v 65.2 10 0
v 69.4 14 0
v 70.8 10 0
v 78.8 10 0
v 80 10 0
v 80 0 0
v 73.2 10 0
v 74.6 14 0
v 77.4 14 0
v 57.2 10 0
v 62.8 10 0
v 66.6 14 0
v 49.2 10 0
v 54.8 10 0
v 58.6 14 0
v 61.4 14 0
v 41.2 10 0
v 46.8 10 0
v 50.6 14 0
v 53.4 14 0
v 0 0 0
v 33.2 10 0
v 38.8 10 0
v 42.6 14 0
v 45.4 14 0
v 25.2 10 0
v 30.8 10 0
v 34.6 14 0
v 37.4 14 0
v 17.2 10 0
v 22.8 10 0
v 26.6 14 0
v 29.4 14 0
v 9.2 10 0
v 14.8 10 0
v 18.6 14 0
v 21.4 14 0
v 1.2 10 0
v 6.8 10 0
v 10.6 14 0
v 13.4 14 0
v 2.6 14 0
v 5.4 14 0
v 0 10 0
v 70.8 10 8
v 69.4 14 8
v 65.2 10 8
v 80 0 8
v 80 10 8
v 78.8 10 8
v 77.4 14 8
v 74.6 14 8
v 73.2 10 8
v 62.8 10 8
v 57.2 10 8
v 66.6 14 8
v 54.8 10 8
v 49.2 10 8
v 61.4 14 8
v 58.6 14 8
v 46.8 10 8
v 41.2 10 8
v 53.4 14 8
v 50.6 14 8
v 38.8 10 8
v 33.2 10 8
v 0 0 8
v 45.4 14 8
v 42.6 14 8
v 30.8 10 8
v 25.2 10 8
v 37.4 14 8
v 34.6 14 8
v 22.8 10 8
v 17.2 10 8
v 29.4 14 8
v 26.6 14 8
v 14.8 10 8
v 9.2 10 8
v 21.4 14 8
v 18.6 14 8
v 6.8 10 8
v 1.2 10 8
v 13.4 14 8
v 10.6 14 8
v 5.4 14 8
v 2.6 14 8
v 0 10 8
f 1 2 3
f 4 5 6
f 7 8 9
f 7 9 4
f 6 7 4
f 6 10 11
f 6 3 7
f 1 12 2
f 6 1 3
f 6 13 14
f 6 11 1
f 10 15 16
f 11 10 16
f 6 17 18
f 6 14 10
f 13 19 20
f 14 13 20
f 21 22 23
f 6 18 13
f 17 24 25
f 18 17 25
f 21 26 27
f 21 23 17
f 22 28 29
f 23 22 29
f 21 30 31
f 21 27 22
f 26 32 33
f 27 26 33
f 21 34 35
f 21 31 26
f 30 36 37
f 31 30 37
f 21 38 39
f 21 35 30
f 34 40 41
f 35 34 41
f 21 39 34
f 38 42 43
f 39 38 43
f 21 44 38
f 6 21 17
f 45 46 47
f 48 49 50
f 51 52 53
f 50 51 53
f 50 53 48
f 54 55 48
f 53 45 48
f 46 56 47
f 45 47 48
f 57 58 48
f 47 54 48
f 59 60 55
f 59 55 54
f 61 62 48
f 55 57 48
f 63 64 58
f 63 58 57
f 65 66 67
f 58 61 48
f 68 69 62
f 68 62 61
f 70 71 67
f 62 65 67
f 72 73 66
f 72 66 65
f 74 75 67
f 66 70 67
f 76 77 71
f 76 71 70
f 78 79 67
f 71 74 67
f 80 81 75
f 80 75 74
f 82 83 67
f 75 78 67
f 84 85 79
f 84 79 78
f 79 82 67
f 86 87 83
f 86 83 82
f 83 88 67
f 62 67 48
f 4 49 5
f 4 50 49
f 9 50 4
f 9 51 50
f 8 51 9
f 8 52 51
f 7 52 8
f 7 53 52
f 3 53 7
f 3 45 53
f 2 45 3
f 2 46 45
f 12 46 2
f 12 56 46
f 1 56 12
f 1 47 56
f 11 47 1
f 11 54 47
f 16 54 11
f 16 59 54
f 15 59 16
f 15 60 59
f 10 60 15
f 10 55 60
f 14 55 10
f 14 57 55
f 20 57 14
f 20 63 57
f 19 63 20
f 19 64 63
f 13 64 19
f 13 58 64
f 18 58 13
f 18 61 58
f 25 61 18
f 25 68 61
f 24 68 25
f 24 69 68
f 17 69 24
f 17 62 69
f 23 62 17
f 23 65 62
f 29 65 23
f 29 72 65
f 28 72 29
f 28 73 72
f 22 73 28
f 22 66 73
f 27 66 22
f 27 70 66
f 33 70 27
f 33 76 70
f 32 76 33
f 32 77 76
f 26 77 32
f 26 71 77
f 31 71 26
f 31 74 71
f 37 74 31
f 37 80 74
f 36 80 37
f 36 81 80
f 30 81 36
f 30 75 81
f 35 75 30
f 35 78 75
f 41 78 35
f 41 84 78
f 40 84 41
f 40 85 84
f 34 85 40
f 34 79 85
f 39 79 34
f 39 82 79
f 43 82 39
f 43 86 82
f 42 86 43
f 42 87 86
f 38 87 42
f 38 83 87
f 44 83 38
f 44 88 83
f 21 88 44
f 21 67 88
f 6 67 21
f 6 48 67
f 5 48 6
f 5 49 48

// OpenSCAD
$fn = 32;

// ----------------------------------------------------------------------
// Gear rack: 10 teeth, pitch 8 mm
// ----------------------------------------------------------------------

// --- parameters (mm) ---
teeth = 10;               // number of teeth
pitch = 8;                // tooth pitch, X
root_w = 5.6;             // tooth width at the root
tip_w = 2.8;              // tooth width at the tip
base_h = 10;              // rack body height, Y
tooth_h = 4;              // tooth height above the body
plate_t = 8;              // rack width, Z (extrusion height)
fit_tol = 0.02;           // declared fit tolerance (prompt contract)
free_tol = 0.2;           // declared free tolerance (prompt contract)

rack_l = teeth * pitch;  // overall length
total_h = base_h + tooth_h;  // overall height

profile = [[0, 0], [80, 0], [80, 10], [78.8, 10], [77.4, 14], [74.6, 14], [73.2, 10], [70.8, 10], [69.4, 14], [66.6, 14], [65.2, 10], [62.8, 10], [61.4, 14], [58.6, 14], [57.2, 10], [54.8, 10], [53.4, 14], [50.6, 14], [49.2, 10], [46.8, 10], [45.4, 14], [42.6, 14], [41.2, 10], [38.8, 10], [37.4, 14], [34.6, 14], [33.2, 10], [30.8, 10], [29.4, 14], [26.6, 14], [25.2, 10], [22.8, 10], [21.4, 14], [18.6, 14], [17.2, 10], [14.8, 10], [13.4, 14], [10.6, 14], [9.2, 10], [6.8, 10], [5.4, 14], [2.6, 14], [1.2, 10], [0, 10]];  // primary outline, 44 points, counter clockwise

// --- the one profile operation ---
linear_extrude(height = plate_t) polygon(points = profile);
